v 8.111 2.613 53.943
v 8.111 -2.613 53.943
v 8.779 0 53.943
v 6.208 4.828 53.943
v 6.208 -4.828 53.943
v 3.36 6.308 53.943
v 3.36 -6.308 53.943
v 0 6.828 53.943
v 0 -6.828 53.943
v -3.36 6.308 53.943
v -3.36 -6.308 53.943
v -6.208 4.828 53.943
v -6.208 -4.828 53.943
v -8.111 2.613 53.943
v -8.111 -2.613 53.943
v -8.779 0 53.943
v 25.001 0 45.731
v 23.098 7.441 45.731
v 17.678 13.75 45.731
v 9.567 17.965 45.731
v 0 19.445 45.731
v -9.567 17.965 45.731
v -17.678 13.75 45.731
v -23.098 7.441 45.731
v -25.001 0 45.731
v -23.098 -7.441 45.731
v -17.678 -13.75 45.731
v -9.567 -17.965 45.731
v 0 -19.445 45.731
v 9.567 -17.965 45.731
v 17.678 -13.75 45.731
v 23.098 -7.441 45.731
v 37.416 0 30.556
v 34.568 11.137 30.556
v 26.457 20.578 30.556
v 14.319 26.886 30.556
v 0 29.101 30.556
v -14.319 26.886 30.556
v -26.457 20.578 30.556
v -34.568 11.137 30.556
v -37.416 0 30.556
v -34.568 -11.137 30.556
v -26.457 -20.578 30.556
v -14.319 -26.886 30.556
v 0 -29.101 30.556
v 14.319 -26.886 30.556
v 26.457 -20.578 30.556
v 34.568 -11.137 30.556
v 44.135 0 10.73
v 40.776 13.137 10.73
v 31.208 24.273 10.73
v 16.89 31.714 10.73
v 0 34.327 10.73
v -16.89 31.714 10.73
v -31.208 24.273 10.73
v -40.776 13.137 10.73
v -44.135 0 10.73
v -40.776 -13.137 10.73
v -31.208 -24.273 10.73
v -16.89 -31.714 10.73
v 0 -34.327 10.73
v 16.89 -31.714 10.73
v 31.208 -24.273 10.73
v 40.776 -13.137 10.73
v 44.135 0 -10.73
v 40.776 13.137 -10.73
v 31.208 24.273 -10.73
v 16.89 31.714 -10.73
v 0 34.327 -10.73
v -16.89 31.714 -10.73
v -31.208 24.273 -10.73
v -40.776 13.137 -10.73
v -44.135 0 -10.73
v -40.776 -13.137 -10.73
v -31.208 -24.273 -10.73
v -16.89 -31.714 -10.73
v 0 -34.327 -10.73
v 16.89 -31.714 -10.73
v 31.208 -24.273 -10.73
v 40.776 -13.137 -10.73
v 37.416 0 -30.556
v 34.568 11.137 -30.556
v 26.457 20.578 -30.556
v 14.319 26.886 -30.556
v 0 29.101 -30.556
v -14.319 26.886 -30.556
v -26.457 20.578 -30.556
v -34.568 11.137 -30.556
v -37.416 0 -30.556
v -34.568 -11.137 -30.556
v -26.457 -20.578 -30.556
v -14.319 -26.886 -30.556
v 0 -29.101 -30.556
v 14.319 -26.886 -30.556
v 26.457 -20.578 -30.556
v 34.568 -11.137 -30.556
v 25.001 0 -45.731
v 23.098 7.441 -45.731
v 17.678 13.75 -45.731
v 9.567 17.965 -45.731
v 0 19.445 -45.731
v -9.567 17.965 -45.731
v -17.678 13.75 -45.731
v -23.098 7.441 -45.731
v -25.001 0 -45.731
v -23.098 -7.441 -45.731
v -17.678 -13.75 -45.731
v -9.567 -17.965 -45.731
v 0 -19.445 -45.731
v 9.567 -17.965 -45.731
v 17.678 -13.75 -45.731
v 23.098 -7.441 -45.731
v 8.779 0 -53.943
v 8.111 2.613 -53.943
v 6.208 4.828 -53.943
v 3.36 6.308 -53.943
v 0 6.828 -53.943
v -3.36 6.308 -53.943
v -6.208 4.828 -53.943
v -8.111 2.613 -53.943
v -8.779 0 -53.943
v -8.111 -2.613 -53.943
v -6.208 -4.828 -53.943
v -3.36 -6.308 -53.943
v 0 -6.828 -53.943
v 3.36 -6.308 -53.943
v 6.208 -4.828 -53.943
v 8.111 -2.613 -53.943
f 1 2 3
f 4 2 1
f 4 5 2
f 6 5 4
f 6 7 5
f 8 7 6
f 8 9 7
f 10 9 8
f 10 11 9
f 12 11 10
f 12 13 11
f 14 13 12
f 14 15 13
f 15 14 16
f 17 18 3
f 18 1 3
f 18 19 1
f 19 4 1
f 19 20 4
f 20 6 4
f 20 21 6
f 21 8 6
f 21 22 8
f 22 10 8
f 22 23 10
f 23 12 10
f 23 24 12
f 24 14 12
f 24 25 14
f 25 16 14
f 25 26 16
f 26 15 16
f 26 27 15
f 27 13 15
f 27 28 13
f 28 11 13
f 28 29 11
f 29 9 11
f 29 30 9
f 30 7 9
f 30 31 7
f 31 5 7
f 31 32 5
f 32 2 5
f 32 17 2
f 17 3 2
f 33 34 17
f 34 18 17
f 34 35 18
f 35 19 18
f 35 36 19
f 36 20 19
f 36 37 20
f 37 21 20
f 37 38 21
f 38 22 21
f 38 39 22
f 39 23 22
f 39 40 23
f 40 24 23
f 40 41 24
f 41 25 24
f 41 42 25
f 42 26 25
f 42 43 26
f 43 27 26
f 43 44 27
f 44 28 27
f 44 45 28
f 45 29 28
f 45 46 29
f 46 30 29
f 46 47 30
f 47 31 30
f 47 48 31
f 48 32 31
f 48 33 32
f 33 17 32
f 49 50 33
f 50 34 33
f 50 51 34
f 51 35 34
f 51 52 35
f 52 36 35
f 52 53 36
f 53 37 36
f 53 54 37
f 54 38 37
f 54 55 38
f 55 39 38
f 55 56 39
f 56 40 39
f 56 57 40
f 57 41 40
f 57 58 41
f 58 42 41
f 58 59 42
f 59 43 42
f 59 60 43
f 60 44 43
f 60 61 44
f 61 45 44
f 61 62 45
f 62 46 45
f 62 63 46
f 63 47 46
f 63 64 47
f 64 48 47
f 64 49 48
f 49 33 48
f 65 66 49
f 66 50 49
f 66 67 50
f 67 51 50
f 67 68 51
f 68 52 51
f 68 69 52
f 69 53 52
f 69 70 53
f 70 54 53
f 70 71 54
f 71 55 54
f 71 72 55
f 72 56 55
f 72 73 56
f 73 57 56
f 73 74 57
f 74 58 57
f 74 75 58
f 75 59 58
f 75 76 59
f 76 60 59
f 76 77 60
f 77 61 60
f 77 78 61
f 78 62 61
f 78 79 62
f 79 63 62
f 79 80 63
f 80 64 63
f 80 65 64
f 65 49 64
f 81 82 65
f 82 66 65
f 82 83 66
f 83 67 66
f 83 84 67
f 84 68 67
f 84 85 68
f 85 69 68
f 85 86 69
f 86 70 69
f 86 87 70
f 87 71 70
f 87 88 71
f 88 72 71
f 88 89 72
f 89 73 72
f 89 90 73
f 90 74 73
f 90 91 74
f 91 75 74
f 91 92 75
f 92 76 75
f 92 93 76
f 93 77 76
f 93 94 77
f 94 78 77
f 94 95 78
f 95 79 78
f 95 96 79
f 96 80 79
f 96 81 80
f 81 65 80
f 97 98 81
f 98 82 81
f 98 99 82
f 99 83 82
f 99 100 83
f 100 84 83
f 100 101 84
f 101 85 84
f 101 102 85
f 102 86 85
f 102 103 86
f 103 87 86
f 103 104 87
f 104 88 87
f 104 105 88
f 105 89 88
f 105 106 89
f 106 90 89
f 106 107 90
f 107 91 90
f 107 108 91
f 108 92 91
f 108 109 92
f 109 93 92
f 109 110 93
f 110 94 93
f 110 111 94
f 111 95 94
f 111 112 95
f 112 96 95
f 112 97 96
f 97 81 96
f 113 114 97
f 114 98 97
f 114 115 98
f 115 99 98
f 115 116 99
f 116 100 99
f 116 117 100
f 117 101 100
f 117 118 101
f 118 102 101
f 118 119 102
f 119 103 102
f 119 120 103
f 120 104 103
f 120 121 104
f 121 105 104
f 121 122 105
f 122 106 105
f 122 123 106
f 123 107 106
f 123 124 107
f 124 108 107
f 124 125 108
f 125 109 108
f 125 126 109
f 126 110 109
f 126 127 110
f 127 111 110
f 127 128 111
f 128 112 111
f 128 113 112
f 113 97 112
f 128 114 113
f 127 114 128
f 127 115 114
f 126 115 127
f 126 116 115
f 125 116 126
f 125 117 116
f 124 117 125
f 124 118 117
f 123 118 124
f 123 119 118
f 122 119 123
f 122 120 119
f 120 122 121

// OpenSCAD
// Generated by SolidPython 1.0.1 on 2020-07-29 00:46:48


scale(v = [9, 7, 11]) {
	sphere(r = 5);
}
/***********************************************
*********      SolidPython code:      **********
************************************************
 
# import packages: SolidPython
from solid import *
from solid.utils import *
from itertools import chain, combinations, permutations


class Resize:

    def __init__(self, scad_file):
        self.scad_file = scad_file
        #self.scad_file = import_scad(scad_file)
        # cone/cylinder param:
        self.r1 = 0
        self.r2 = 0
        self.h = 0
        # rectangular prism param:
        self.w = 0
        self.l = 0
        # ellipse param:
        self.r = 0

    # import OpenScad code (file name corresponds to shape)


    # classify shape + parameters
    def assign(self, param1, param2, param3):
        if self.scad_file == 'cone.scad':
            self.r1 = param1
            self.r2 = param2
            self.h = param3
        elif self.scad_file == 'cylinder.scad':
            self.r1 = param1
            self.r2 = param2
            self.h = param3
        elif self.scad_file == 'rectangularPrism.scad':
            self.h = param1
            self.l = param2
            self.w = param3
        else:
            self.r = param1
            self.h = param2

    # resize parameters
    def iterate(self):
        x = range(3, 20, 2)
        i = 1
        if self.scad_file == 'cone.scad':
            tempList = list(permutations(x, 2))
            for temp in tempList:
                param1 = temp[0]
                param2 = temp[1]
                filepath = 'produced_scad_files/' + 'cone' + str(param1) + '_' + str(param2) + '_' + '.scad'
                scad_render_to_file(cylinder(h=param1, r1=param2, r2=0), filepath)

        elif self.scad_file == 'cylinder.scad':
            tempList = list(permutations(x, 3))
            for temp in tempList:
                param1 = temp[0]
                param2 = temp[1]
                filepath = 'produced_scad_files/' + 'cylinder' + str(param1) + '_' + str(param2) + '_' + '.scad'
                scad_render_to_file(cylinder(h=param1, r1=param2, r2=param2), filepath)

        elif self.scad_file == 'rectangularPrism.scad':
            tempList = list(permutations(x, 3))
            for temp in tempList:
                param1 = temp[0]
                param2 = temp[1]
                param3 = temp[2]
                filepath = 'produced_scad_files/' + 'rectangularPrism' + str(param1) + '_' + str(param2) + '_' + str(
                    param3) + '.scad'
                scad_render_to_file(cube(size=(param1, param2, param3)), filepath)

        elif self.scad_file == 'ellipse.scad':
            tempList = list(permutations(x, 4))
            for temp in tempList:
                param1 = temp[0]
                param2 = temp[1]
                param3 = temp[2]
                param4 = temp[3]
                filepath = 'produced_scad_files/' + 'ellipse' + str(param1) + '_' + str(param2) + '_' + str(param3) + '_' + str(param4) + '.scad'
                scad_render_to_file(scale([param1, param2, param3])(sphere(r=param4)), filepath)

    def render_to_scadfile(self):
        scad_render_to_file(scad, 'example.scad') 
 
************************************************/
